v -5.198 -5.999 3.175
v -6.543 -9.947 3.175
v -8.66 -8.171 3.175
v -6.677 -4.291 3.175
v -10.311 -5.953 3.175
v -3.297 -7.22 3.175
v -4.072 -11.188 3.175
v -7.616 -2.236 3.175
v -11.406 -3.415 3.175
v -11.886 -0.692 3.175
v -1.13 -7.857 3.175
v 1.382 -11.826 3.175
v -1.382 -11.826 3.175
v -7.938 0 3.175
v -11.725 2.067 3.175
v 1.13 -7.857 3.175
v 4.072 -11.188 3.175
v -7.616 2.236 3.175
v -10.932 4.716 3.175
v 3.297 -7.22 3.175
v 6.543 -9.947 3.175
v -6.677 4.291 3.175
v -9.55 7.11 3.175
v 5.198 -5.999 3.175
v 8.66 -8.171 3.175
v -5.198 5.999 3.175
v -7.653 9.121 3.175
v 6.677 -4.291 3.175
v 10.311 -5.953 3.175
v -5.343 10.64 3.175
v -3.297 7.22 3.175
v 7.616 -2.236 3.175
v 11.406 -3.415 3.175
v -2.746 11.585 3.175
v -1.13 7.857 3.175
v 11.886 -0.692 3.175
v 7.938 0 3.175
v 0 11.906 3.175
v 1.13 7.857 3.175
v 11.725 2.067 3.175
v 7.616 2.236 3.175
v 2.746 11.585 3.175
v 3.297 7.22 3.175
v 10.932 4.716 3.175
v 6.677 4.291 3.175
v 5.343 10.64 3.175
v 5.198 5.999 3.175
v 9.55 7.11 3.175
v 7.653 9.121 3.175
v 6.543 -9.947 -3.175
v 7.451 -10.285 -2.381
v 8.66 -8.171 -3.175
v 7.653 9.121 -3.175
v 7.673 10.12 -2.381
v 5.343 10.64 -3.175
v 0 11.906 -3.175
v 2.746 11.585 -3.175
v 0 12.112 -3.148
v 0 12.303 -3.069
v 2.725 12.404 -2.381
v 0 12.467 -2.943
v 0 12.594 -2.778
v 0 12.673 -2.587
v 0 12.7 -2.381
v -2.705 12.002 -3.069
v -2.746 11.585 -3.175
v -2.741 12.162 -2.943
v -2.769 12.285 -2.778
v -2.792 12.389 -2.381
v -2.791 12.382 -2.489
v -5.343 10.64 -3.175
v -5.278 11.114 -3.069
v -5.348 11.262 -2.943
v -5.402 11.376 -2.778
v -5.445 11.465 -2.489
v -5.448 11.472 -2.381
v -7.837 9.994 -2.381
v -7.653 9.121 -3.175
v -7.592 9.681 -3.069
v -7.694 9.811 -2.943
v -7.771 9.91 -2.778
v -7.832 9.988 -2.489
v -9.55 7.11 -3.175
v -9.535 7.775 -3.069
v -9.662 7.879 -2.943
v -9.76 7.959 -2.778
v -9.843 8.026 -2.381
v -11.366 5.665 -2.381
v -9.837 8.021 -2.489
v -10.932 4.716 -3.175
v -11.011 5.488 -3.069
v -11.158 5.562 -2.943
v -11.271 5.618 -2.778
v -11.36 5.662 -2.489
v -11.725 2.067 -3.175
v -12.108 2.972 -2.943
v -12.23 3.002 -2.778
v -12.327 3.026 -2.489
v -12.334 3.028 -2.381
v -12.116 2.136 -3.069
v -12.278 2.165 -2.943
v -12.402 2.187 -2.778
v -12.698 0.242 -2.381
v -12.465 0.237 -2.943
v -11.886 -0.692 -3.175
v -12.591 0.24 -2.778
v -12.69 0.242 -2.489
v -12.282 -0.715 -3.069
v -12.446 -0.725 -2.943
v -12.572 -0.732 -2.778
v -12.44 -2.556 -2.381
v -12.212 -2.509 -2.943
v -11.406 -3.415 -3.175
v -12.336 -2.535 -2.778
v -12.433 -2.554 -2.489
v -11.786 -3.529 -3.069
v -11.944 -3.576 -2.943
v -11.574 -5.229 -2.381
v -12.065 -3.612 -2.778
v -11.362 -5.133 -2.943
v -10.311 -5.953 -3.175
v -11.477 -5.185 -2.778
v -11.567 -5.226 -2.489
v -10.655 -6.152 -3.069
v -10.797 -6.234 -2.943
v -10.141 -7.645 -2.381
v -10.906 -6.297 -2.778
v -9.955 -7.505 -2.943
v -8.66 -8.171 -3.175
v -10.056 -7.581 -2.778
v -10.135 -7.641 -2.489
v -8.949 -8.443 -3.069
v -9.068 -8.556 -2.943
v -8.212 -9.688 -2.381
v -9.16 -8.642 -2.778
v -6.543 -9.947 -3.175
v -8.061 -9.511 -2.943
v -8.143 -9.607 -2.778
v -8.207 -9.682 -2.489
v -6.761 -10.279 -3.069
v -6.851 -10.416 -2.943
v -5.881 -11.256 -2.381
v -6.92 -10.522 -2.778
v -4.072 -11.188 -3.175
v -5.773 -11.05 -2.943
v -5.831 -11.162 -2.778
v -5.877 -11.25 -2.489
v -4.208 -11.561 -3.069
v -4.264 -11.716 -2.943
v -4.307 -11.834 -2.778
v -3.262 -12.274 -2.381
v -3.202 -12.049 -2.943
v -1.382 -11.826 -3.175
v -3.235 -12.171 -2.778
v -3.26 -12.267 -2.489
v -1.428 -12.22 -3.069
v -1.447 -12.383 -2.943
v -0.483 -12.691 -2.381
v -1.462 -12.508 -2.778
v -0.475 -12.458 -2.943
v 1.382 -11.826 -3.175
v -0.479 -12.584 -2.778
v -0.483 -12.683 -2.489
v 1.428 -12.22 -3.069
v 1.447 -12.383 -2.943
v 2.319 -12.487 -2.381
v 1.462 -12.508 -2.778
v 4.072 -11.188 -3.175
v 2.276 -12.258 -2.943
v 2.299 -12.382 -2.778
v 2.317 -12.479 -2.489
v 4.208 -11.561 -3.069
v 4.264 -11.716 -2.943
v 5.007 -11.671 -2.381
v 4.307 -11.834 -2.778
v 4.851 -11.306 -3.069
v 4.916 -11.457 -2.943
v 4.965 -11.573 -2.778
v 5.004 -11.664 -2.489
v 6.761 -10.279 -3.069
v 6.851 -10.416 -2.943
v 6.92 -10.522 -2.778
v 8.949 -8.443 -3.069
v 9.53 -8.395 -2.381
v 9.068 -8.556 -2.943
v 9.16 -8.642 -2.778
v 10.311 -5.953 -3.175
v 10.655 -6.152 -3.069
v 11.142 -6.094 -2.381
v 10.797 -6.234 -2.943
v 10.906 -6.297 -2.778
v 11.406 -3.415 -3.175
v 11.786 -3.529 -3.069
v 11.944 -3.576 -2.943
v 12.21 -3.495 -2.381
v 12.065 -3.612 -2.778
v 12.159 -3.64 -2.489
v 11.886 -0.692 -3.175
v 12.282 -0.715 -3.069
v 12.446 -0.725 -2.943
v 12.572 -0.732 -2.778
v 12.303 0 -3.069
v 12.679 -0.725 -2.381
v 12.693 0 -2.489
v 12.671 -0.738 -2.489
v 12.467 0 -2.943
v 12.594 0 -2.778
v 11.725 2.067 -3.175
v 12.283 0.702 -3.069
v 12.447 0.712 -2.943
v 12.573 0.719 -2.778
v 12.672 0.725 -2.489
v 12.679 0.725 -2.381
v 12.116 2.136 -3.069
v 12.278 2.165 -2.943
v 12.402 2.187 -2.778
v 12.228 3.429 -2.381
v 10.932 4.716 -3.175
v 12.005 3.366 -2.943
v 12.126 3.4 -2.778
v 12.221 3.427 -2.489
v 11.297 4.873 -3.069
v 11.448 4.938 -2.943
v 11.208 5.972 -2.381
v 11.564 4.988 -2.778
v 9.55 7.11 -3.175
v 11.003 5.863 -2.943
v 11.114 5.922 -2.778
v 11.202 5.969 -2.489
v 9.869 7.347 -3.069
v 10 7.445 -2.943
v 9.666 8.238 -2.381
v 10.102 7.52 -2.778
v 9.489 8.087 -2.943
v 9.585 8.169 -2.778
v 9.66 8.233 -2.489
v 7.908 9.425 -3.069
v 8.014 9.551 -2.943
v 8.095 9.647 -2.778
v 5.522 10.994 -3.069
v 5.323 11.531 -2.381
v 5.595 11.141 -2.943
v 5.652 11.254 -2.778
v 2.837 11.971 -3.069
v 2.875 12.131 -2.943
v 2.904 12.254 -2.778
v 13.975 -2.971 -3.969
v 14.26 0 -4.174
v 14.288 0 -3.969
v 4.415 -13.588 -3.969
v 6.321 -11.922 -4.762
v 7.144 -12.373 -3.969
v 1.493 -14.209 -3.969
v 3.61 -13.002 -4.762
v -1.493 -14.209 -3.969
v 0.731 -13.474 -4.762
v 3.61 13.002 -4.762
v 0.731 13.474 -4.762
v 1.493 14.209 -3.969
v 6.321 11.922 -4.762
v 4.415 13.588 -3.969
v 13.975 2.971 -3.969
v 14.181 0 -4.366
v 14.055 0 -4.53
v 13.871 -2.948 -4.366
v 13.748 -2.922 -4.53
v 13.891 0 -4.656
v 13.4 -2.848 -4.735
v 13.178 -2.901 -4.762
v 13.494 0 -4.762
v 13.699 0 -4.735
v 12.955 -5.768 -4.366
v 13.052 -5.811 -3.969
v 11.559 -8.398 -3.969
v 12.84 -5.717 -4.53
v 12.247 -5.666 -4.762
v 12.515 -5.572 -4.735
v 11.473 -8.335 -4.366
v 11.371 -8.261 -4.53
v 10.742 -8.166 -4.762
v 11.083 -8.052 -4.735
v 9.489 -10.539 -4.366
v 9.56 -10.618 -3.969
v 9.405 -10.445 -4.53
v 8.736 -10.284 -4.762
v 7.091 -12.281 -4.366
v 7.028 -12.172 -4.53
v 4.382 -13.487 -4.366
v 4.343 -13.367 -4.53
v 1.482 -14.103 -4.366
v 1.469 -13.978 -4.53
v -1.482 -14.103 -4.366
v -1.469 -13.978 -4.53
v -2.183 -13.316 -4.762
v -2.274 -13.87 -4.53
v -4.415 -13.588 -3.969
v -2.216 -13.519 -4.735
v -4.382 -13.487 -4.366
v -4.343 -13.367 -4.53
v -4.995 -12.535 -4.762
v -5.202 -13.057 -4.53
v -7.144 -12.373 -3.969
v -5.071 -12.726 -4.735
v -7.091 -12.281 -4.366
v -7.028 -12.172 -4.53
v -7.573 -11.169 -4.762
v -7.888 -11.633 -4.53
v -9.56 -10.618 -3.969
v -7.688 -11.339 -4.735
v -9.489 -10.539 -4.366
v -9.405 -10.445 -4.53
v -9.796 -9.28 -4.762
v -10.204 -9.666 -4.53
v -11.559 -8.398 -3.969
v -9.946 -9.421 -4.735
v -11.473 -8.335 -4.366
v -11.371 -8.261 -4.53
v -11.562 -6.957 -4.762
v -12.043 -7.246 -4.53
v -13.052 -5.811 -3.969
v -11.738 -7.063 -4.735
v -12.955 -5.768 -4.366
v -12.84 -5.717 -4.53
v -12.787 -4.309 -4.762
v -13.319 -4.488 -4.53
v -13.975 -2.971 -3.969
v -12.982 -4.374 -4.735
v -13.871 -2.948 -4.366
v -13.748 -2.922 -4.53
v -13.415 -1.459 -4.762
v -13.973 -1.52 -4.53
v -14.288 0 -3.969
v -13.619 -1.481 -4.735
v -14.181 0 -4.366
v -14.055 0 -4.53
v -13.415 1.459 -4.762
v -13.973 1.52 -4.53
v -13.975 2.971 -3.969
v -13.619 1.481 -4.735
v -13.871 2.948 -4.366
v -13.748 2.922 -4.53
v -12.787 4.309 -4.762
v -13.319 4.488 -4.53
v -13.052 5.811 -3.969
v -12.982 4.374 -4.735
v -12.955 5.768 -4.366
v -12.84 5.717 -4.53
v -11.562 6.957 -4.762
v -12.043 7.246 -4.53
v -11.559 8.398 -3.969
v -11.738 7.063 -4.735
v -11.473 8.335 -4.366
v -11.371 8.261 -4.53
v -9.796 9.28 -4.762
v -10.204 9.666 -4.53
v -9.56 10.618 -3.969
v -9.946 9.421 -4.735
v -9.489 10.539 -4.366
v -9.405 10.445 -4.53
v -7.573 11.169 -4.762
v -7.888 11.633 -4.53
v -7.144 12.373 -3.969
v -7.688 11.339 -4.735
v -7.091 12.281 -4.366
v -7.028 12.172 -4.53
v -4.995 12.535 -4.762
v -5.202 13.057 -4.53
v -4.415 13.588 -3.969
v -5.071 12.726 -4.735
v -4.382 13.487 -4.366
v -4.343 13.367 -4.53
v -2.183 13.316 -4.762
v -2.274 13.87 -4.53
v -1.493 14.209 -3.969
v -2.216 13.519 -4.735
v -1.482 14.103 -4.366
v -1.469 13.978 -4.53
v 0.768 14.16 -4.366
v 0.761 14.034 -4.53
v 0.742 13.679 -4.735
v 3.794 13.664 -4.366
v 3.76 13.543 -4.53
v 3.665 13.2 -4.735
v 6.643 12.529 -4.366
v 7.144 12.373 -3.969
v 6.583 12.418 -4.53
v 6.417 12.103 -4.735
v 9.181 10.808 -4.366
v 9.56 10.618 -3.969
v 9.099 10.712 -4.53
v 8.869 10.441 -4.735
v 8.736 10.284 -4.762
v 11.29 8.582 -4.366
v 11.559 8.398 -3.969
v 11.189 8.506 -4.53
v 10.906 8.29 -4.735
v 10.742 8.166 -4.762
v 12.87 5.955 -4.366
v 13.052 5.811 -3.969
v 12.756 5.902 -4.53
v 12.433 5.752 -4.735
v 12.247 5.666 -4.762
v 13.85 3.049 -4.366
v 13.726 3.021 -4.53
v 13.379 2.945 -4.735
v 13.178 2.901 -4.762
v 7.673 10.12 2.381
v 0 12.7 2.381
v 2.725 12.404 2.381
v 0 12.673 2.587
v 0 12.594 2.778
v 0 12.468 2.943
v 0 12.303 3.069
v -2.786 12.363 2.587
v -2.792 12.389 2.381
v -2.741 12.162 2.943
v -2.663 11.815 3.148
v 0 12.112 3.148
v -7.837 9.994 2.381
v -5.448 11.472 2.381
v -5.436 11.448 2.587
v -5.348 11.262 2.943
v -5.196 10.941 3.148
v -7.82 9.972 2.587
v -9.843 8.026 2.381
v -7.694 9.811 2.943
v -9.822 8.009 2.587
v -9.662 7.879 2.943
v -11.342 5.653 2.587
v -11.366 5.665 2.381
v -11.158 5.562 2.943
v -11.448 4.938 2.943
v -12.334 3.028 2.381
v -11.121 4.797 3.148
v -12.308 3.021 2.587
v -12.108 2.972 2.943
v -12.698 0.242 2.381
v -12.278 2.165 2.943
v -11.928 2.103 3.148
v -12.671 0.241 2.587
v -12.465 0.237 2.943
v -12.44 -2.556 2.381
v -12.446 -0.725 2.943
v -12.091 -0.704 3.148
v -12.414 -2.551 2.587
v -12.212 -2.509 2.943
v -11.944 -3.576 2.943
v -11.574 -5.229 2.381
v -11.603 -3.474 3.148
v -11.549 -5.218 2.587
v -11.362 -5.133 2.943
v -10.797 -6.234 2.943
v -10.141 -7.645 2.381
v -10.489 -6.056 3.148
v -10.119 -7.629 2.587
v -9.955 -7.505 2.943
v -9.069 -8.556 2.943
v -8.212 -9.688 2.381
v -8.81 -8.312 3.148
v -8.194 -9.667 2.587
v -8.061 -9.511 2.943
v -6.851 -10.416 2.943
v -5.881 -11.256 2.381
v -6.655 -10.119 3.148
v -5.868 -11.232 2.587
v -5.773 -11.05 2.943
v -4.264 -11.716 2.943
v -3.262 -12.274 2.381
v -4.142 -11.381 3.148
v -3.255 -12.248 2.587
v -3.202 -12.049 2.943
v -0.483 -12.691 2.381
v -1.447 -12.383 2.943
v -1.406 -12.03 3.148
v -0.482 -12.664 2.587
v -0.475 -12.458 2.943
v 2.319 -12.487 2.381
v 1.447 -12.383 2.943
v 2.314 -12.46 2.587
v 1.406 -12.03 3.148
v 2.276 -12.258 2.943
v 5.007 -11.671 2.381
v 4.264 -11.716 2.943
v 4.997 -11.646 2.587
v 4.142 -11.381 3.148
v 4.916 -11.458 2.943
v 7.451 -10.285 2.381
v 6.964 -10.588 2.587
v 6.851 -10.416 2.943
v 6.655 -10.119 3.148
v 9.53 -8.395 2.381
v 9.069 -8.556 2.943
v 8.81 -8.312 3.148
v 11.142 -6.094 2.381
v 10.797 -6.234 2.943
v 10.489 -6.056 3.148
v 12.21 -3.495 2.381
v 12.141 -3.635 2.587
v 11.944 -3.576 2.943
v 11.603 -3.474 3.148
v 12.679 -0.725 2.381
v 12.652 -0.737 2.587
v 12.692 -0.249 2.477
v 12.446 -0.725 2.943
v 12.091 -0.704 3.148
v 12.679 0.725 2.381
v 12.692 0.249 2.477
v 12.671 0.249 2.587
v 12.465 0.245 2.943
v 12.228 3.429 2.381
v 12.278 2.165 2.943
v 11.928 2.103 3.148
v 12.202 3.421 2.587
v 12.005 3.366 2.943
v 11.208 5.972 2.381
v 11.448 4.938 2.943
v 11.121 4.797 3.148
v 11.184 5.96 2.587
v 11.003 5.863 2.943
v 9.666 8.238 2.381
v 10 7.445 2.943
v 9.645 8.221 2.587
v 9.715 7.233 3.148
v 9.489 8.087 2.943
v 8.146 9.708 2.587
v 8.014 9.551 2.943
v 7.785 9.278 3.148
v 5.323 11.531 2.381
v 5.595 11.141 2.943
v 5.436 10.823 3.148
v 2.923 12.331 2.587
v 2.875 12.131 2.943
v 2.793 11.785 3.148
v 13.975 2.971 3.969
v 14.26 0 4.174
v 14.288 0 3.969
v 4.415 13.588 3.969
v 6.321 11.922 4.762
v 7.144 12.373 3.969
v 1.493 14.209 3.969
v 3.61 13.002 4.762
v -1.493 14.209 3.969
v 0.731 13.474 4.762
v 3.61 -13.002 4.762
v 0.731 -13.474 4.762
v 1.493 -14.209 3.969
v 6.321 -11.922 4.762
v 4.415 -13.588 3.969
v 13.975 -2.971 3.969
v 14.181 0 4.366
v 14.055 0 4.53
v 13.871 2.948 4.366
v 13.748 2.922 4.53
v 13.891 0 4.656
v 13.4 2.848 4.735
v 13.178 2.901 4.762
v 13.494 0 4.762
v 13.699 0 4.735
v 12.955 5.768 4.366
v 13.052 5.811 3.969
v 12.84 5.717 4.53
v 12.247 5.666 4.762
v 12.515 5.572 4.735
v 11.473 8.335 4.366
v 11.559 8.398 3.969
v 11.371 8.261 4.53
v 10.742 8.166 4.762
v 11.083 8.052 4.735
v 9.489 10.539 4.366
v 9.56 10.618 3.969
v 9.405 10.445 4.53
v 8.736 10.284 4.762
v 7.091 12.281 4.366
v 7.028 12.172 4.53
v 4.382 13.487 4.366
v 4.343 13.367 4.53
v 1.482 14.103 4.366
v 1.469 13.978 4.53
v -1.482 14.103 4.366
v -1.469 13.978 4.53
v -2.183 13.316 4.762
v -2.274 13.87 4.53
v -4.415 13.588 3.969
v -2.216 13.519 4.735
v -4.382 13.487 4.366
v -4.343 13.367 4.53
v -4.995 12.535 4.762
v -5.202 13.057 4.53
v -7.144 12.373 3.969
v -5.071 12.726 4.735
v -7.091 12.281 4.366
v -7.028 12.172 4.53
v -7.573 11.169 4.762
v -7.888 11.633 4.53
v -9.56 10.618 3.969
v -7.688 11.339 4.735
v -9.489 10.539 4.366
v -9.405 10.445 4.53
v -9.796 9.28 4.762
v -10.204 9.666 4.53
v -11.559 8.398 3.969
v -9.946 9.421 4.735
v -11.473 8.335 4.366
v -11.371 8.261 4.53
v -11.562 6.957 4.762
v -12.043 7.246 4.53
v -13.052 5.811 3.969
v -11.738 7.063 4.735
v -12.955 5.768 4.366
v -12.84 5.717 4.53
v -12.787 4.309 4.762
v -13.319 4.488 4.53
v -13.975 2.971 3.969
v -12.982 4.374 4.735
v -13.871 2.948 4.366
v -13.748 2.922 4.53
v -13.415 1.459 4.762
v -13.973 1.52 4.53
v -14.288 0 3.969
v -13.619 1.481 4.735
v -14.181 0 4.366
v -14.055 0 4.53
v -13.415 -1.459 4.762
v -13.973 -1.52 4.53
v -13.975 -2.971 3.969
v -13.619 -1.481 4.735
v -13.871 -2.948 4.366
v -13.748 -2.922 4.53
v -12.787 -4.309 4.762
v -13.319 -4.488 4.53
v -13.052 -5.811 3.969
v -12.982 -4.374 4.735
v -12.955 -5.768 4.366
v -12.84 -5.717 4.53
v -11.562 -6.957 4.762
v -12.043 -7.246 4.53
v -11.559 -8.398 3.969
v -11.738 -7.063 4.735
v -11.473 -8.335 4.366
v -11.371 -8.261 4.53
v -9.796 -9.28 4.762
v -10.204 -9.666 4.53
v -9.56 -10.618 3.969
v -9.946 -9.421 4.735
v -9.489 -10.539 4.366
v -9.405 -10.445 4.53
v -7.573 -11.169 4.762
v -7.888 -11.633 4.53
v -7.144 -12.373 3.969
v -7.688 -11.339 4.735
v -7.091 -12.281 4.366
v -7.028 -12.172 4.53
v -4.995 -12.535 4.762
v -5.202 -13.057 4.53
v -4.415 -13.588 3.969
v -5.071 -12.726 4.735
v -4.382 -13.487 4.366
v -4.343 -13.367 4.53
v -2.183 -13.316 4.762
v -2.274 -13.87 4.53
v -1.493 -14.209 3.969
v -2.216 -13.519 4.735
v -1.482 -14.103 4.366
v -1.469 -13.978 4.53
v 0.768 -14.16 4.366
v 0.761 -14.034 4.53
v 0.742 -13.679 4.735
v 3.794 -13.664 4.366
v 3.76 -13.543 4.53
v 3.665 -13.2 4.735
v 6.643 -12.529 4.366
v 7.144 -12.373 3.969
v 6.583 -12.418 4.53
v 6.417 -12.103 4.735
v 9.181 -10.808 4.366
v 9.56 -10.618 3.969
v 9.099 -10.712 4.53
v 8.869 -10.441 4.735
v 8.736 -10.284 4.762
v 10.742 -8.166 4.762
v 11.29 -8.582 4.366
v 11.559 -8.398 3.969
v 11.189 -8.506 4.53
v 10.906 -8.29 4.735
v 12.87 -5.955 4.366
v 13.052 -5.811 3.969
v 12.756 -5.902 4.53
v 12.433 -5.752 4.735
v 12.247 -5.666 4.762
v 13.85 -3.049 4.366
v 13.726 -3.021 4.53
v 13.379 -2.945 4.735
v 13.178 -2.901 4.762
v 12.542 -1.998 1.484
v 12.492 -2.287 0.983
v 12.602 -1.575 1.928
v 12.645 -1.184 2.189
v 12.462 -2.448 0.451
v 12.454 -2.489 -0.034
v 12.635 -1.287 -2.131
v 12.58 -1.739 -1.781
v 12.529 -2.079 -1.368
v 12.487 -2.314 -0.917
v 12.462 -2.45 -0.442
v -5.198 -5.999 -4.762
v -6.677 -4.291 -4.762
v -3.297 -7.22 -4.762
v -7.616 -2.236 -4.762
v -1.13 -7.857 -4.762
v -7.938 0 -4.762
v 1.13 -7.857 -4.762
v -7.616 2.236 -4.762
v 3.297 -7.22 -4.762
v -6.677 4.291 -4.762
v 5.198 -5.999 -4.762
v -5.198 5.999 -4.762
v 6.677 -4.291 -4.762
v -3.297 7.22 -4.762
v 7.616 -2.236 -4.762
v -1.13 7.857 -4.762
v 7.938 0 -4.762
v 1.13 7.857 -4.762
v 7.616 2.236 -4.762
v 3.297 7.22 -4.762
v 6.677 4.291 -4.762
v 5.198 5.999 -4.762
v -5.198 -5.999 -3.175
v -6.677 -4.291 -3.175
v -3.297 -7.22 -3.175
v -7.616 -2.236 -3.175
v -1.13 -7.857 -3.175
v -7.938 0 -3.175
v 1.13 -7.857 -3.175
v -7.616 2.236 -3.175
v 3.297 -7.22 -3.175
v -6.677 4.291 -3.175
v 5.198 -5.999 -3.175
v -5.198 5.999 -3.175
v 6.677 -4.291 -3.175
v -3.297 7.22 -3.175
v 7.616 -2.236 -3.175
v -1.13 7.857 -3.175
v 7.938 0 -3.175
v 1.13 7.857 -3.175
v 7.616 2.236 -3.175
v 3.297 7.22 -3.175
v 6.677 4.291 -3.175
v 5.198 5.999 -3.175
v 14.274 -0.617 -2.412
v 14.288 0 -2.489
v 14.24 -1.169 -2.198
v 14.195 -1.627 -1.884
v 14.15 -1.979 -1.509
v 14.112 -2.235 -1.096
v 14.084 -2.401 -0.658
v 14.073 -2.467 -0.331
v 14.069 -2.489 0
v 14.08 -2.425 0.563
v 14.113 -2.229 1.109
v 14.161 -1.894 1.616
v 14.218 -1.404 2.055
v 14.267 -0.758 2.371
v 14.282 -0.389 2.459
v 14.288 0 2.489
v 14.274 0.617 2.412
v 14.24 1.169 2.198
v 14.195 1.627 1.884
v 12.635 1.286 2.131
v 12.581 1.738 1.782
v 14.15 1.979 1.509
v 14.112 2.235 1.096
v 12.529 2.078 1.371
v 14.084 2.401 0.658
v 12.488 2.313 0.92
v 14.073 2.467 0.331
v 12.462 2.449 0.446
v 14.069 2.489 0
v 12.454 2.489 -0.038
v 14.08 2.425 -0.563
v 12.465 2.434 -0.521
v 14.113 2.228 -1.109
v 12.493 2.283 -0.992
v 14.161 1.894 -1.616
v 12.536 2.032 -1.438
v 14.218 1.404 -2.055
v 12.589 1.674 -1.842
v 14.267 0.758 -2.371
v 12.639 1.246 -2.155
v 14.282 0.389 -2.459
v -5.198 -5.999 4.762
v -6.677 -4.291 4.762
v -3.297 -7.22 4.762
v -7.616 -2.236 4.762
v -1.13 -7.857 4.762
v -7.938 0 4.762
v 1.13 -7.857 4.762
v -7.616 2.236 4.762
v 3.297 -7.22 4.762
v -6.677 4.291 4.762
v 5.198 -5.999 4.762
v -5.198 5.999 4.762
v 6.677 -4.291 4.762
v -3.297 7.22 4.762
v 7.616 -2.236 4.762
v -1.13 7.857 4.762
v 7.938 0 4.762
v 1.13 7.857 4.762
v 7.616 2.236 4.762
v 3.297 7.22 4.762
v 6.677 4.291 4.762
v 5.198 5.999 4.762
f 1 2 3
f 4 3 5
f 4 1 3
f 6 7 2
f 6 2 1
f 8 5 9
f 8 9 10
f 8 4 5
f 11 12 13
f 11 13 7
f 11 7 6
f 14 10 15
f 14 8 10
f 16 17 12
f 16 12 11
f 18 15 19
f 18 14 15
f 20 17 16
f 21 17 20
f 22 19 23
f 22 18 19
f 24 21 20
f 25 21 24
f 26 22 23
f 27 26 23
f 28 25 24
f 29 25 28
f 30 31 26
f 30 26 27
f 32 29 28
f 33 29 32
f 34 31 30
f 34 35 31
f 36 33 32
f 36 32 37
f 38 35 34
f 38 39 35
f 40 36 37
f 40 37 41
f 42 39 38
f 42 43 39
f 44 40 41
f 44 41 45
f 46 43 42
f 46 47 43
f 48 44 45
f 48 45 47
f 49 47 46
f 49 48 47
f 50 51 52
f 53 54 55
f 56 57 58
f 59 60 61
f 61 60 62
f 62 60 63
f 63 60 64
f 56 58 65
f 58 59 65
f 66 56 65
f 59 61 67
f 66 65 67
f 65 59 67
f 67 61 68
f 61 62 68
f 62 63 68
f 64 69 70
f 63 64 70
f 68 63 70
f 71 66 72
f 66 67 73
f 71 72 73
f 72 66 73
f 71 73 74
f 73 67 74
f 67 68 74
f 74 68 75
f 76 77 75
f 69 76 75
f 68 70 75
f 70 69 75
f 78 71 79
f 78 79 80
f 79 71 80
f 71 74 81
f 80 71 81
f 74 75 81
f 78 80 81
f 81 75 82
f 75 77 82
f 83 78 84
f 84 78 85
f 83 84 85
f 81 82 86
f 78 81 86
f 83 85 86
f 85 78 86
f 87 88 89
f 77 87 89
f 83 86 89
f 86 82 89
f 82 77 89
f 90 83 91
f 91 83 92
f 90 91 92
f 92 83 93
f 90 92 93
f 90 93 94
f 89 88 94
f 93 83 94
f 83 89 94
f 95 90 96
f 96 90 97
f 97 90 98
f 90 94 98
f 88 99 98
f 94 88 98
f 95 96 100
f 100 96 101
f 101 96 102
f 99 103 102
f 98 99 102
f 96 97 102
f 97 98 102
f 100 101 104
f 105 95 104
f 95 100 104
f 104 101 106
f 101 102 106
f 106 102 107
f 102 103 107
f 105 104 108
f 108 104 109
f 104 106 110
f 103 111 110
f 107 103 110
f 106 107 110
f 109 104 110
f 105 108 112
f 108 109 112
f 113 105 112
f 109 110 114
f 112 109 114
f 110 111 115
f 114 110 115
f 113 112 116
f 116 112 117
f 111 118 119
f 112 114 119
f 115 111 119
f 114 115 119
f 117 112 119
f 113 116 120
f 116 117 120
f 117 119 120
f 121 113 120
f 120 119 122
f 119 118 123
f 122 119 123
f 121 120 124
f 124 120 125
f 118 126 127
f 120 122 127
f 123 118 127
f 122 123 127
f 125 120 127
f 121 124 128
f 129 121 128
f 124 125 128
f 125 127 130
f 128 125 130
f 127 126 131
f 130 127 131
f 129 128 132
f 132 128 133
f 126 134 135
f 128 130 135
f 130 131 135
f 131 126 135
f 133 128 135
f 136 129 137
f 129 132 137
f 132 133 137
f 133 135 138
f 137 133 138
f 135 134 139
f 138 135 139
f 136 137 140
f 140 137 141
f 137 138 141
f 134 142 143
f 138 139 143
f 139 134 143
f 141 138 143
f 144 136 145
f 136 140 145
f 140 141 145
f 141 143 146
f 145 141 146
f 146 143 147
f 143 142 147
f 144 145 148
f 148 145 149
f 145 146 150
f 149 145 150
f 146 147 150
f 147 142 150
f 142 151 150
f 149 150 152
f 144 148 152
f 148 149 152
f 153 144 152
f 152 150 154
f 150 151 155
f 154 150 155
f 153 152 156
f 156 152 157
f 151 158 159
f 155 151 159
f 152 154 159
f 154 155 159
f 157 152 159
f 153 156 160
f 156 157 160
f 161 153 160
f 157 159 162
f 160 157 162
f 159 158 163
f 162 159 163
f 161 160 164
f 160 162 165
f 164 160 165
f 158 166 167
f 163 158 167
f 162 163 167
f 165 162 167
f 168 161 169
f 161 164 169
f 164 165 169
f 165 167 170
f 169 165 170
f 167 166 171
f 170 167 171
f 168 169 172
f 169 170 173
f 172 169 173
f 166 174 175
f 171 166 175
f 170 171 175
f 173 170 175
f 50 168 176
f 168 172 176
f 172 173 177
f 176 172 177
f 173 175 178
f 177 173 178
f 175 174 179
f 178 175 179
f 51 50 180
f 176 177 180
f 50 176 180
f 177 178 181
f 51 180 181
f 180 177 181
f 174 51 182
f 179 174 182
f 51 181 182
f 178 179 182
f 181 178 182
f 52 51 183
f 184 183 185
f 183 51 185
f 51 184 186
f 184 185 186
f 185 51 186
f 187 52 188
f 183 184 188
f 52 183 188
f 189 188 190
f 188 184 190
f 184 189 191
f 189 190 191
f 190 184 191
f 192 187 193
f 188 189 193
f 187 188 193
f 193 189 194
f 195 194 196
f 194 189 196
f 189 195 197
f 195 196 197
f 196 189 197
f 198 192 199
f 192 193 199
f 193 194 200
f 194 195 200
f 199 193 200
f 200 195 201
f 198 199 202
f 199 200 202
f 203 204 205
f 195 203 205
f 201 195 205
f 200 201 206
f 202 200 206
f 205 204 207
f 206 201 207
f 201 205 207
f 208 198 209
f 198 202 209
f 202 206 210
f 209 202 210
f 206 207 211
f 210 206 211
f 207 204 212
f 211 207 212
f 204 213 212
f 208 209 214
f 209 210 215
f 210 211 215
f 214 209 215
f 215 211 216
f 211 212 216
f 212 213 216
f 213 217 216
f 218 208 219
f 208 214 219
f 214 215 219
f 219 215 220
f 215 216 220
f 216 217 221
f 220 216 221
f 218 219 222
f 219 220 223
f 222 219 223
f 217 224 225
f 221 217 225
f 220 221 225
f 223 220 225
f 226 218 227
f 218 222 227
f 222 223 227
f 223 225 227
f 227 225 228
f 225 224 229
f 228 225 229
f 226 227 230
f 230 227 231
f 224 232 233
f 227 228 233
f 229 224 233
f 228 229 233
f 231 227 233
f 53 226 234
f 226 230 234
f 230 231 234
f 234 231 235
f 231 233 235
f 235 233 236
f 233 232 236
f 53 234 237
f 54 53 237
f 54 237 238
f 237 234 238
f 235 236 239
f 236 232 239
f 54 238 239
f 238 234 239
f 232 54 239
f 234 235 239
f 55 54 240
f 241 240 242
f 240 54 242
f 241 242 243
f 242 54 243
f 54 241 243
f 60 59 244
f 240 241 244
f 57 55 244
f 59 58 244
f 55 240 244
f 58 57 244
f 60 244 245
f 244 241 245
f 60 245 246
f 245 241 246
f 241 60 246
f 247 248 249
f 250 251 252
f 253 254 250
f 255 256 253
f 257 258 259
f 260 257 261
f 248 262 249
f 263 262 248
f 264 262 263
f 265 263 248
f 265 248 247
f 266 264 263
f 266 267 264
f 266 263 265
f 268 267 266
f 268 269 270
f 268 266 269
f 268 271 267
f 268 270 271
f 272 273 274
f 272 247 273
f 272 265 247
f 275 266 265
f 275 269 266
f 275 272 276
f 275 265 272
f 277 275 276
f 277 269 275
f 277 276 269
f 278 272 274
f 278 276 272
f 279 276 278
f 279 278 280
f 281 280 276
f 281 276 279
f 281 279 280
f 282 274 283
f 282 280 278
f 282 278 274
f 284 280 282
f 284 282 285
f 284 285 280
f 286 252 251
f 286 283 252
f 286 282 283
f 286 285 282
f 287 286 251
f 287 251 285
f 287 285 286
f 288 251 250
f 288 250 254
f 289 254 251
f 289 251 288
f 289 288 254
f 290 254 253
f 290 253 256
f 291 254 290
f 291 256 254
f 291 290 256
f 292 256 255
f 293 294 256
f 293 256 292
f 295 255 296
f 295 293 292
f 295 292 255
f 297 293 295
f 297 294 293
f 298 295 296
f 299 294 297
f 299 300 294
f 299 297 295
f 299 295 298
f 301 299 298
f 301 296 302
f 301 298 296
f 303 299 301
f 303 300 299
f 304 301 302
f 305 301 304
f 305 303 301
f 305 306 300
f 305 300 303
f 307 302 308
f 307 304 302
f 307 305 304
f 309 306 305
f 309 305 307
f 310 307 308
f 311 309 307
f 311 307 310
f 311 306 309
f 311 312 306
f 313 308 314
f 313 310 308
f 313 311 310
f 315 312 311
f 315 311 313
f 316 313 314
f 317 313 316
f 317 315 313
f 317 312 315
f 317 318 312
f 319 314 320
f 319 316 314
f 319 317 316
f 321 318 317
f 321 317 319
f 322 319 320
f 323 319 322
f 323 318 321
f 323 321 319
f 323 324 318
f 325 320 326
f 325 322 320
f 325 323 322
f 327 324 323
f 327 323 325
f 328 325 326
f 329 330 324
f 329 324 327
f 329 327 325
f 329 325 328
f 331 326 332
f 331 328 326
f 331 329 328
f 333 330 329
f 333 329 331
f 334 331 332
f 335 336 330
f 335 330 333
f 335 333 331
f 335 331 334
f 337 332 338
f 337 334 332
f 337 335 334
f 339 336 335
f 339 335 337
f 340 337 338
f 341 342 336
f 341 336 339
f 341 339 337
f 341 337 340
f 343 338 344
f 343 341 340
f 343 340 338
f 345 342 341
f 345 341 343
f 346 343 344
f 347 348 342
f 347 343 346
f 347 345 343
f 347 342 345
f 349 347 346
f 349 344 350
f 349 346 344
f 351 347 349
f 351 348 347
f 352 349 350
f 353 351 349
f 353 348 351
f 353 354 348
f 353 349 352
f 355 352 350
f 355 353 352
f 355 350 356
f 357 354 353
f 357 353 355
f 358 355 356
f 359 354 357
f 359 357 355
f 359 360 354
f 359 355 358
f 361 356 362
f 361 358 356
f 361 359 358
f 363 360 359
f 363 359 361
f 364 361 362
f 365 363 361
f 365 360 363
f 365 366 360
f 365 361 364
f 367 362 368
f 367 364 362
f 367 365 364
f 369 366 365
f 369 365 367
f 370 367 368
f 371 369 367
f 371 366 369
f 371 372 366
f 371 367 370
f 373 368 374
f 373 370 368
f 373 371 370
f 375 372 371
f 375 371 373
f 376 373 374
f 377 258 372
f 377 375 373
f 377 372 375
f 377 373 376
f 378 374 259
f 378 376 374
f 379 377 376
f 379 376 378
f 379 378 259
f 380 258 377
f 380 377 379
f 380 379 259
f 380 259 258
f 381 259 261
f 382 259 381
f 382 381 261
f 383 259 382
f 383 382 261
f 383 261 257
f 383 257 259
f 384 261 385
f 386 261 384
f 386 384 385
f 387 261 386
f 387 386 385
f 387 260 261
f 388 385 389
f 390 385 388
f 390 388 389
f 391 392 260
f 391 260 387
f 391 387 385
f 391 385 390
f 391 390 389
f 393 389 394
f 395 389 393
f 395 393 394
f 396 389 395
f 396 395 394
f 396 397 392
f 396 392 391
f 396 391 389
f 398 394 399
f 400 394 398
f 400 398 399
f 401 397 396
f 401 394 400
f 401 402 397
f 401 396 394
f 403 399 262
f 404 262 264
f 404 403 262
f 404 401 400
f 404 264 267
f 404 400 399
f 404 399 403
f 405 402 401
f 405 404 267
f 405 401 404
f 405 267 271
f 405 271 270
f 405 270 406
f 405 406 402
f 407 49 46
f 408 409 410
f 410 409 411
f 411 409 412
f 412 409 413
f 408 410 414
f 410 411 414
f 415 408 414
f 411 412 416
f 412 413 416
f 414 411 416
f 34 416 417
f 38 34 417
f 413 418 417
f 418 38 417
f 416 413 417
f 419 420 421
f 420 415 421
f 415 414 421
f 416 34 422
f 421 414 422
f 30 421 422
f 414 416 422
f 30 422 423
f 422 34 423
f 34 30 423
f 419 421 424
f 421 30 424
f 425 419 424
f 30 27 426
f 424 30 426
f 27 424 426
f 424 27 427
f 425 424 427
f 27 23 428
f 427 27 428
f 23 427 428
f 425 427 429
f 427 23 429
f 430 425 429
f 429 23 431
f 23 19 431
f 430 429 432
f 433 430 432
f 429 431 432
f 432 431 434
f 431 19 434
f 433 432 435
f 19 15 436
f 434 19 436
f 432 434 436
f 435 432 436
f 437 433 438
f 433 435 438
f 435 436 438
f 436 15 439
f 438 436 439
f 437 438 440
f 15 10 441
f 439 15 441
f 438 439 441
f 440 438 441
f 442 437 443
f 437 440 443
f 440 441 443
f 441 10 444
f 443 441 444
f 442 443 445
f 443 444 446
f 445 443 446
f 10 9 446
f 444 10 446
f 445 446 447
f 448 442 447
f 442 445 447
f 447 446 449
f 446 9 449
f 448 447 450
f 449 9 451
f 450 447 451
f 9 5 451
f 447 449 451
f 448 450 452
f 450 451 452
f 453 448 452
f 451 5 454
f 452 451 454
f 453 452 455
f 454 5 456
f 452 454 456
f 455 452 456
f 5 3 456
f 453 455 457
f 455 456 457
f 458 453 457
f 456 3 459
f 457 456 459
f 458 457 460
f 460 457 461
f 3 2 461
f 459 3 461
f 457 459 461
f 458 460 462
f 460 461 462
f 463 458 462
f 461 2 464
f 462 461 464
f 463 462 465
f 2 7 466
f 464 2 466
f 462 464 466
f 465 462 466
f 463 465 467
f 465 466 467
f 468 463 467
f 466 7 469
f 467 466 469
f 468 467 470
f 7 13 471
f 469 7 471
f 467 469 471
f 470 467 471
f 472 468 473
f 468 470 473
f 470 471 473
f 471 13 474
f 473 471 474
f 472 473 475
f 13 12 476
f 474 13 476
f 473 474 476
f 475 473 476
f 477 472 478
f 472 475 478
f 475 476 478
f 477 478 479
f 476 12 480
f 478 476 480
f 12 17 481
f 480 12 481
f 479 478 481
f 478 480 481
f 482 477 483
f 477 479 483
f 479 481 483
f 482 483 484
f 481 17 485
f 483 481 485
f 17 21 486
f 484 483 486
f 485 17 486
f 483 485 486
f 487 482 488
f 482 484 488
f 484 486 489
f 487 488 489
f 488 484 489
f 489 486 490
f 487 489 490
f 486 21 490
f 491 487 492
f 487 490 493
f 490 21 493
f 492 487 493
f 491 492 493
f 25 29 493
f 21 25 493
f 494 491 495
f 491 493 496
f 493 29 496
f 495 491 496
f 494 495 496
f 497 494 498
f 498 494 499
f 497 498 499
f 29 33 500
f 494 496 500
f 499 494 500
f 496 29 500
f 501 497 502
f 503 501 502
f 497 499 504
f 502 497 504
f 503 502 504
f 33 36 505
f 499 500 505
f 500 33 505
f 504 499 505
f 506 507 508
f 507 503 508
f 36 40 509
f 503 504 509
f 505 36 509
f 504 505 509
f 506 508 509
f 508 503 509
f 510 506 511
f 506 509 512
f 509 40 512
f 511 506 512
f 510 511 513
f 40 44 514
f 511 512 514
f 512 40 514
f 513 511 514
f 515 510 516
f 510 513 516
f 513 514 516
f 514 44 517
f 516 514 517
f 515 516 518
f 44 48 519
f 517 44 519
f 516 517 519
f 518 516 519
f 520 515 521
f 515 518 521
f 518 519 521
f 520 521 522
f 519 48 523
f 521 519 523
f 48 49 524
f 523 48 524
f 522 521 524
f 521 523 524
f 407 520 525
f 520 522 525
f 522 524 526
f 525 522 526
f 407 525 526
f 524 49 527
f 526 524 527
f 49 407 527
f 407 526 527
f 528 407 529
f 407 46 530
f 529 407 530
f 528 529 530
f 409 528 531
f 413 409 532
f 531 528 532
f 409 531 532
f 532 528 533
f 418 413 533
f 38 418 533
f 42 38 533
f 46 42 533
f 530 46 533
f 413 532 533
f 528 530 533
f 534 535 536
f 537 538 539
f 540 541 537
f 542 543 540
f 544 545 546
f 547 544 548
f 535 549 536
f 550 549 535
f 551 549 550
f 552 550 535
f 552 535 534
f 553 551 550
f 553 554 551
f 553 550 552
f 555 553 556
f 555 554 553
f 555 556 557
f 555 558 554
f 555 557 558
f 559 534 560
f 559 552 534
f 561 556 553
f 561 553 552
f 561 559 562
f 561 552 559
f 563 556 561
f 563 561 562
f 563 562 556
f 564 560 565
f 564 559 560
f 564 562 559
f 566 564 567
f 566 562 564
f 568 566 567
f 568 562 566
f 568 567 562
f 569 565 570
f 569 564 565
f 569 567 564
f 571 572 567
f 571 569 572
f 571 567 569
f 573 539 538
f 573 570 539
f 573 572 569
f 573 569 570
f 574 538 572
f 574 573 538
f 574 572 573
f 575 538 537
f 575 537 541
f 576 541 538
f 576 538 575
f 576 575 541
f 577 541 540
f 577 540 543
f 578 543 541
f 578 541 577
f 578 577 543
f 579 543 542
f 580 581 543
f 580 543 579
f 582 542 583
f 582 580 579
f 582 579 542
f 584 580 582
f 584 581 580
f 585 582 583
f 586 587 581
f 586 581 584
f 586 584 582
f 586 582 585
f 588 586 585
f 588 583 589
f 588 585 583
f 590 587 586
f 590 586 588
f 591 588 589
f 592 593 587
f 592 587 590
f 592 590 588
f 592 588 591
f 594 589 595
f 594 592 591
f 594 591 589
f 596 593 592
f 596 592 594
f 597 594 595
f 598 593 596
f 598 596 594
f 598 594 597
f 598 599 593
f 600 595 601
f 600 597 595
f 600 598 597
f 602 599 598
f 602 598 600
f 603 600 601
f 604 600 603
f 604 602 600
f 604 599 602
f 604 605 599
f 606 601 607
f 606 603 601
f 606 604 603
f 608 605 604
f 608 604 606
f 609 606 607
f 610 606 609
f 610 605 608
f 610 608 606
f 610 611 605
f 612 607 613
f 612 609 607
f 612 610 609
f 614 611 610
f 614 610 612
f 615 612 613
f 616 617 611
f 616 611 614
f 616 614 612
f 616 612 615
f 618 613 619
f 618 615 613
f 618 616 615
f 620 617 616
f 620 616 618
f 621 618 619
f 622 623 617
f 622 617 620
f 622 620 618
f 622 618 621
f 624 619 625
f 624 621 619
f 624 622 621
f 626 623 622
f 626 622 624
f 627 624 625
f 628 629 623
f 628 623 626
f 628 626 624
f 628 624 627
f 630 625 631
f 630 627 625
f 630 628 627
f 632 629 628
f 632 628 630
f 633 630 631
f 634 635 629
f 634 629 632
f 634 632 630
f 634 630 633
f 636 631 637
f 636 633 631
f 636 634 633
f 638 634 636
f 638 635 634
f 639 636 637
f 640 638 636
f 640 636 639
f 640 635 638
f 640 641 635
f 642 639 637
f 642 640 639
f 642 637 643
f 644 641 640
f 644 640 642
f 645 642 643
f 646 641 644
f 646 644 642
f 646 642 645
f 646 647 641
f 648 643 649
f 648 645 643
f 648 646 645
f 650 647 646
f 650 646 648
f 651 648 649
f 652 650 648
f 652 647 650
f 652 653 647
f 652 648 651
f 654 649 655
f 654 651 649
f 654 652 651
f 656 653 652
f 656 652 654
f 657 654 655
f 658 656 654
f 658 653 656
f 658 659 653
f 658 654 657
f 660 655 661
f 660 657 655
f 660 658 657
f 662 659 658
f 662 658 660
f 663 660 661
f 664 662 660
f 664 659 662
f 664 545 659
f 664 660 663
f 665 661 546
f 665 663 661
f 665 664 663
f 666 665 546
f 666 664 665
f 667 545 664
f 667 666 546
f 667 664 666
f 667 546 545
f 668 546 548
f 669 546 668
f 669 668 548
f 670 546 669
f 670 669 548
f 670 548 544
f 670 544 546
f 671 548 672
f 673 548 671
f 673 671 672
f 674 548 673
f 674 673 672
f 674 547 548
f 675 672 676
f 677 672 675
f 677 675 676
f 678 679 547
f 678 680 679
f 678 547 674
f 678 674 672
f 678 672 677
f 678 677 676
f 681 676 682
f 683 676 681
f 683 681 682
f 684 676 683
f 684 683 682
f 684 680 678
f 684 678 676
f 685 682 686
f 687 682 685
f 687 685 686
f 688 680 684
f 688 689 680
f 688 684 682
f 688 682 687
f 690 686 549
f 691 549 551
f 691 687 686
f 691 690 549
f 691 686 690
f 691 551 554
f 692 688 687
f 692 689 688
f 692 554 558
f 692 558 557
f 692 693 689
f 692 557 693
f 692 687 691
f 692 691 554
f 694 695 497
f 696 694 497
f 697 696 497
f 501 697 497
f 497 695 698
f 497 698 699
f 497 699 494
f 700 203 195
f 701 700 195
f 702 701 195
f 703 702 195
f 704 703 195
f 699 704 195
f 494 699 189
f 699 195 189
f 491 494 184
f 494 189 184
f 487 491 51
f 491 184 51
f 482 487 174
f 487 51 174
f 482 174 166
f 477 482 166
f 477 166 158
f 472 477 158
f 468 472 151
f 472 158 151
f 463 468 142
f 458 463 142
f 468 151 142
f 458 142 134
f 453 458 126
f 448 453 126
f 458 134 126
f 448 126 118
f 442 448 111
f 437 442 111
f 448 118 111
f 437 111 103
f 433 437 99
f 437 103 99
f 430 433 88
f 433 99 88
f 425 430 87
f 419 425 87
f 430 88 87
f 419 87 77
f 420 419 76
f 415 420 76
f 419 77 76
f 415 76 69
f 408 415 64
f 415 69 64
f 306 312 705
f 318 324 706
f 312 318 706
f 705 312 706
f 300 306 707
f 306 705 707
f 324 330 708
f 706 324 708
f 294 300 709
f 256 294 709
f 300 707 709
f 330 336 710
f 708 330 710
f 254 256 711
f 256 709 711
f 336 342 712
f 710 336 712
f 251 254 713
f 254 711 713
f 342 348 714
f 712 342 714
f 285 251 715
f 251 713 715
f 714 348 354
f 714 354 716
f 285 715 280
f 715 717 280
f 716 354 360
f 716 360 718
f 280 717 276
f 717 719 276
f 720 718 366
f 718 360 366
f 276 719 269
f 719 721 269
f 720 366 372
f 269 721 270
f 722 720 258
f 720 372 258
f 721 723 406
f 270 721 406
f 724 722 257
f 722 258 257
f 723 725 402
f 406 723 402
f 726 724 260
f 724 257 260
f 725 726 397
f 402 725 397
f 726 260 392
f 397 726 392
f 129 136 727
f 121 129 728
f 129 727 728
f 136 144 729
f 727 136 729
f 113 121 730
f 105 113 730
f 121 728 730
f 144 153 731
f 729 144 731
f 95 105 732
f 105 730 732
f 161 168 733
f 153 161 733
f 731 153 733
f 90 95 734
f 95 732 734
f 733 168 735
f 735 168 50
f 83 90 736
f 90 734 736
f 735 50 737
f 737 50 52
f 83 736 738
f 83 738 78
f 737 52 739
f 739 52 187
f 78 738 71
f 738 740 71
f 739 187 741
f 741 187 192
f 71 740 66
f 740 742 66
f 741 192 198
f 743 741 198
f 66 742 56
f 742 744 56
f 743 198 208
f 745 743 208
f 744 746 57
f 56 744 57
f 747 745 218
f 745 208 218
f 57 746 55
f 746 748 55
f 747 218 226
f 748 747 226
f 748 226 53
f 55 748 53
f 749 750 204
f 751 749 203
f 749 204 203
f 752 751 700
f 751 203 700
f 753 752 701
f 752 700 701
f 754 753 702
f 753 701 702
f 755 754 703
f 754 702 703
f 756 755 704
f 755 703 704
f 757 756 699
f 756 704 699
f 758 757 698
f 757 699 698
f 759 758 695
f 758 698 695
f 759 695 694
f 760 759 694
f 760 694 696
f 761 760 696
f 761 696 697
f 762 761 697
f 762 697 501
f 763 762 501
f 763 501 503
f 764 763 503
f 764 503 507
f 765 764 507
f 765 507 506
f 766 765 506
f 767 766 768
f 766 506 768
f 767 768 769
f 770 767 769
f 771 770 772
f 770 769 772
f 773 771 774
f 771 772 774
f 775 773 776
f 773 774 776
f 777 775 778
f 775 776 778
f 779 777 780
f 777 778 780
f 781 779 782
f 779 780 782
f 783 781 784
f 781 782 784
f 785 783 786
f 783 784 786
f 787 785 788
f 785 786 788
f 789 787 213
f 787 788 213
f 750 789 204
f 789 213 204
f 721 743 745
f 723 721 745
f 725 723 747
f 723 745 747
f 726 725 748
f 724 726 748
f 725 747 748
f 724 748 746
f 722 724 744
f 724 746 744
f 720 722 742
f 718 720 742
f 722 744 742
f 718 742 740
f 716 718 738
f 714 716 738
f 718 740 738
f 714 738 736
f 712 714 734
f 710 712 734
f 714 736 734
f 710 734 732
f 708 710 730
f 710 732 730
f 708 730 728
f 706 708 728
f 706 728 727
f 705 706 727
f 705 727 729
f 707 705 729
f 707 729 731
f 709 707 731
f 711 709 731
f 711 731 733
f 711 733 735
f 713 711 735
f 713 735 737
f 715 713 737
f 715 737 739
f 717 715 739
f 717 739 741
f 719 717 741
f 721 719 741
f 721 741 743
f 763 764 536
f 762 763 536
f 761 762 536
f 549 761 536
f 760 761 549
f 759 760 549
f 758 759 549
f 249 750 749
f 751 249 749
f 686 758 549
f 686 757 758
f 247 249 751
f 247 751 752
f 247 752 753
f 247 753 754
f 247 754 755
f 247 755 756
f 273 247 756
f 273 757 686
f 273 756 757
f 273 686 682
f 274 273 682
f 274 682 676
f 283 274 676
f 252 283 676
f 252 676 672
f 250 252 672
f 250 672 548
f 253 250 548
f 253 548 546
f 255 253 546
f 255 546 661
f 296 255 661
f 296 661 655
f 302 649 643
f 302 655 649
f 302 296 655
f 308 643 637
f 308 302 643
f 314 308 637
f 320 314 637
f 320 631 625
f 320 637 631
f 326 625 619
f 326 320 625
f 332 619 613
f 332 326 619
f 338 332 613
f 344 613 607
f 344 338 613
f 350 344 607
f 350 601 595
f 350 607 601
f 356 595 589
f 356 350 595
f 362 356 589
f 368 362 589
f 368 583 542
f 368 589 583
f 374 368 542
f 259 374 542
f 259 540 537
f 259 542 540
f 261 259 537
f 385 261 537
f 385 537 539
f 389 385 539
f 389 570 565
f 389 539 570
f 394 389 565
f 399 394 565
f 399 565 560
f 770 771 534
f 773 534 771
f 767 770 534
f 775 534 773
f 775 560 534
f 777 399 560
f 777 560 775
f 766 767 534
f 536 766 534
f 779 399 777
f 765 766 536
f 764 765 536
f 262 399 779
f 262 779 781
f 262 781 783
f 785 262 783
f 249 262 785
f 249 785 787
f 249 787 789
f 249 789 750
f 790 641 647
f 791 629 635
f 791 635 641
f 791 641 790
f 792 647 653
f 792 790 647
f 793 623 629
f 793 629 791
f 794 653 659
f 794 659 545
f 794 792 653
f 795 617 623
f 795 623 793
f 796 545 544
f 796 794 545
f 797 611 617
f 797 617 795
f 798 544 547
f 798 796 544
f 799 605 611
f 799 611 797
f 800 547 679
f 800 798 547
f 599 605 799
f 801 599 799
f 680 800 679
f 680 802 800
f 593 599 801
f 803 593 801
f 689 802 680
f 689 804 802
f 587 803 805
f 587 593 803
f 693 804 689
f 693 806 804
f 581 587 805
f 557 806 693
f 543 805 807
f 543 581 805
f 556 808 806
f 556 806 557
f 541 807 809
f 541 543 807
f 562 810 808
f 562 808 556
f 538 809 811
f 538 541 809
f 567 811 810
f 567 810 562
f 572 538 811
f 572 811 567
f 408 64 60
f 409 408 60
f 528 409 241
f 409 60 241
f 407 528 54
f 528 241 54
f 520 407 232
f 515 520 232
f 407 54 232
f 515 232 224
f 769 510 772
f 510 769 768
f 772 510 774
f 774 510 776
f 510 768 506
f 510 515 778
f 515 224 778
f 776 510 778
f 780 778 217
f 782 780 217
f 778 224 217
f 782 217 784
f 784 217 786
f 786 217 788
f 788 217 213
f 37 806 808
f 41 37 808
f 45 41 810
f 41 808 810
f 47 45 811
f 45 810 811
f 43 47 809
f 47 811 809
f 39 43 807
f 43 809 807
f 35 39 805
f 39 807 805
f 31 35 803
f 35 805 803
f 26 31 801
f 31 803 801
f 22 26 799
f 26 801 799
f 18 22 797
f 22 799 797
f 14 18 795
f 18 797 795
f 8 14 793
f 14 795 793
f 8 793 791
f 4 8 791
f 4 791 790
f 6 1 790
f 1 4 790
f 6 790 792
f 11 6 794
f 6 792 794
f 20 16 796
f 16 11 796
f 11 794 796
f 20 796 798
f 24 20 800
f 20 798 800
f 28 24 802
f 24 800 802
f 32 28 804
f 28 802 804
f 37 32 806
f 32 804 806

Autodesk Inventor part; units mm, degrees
ref_plane "XZ Plane" through (0, 0, 0) normal (0, 1, 0) x (-1, 0, 0)
ref_plane "XY Plane" through (0, 0, 0) normal (0, 0, 1) x (1, 0, 0)
sketch "Sketch1" plane through (0, 0, 0) normal (0, 0, 1) x (1, 0, 0)
  circle A0 centre (0, 0) radius 14.2875
  dimension "d0" = 28.575
extrude "Extrusion1" add sketch "Sketch1" along normal mid plane 9.525
fillet "Fillet1" radius 0.7937 2 edges at (-14.2875, 0, 4.7625) (-14.2875, 0, -4.7625)
sketch "Sketch2" plane through (0, 0, 4.7625) normal (0, 0, 1) x (1, 0, 0)
  circle A0 centre (0, 0) radius 13.4938 projected
  circle A1 centre (0, 0) radius 7.9375
  dimension "d4" = 15.875
extrude "Extrusion2" cut sketch "Sketch2" against normal up to next contours A1
sketch "Sketch3" plane through (0, 0, 0) normal (1, 0, 0) x (0, 1, 0)
  line L0 (7.9375, 3.175) -> (11.9062, 3.175)
  line L1 (12.7, 2.3813) -> (12.7, -2.3813)
  line L2 (11.9062, -3.175) -> (7.9375, -3.175)
  line L3 (7.9375, -3.175) -> (7.9375, 3.175)
  line L4 (-13.4938, 4.7625) -> (13.4938, 4.7625) projected
  line L5 (13.4938, -4.7625) -> (-13.4938, -4.7625) projected
  line L6 (14.2875, -3.9688) -> (14.2875, 3.9688) projected
  line L7 (7.9375, 4.7625) -> (7.9375, -4.7625) projected
  arc A0 (12.7, 2.3813) -> (11.9062, 3.175) centre (11.9062, 2.3813) ccw
  arc A1 (11.9062, -3.175) -> (12.7, -2.3813) centre (11.9062, -2.3813) ccw
  line L8 (0, 4.7625) -> (0, -4.7625)
  point P0 (0, 0)
  dimension "d7" = 1.5875
  dimension "d8" = 1.5875
  dimension "d9" = 1.5875
  dimension "d10" = 0.7937
revolve "Revolution1" cut sketch "Sketch3" angle 360 about axis through (0, 0, 4.7625) along (0, 0, -1) contours L0 A0 L1 A1 L2 L3
ref_plane "Work Plane1" through (14.2875, 0, 0) normal (1, 0, 0) x (0, 1, 0)
sketch "Sketch4" plane through (14.2875, 0, 0) normal (1, 0, 0) x (0, 1, 0)
  line L0 (13.4938, -4.7625) -> (-13.4937, -4.7625) projected
  line L1 (14.2875, -3.9688) -> (14.2875, 3.9688) projected
  point P0 (0, 0)
  point P1 (0, 0)
hole "Hole1" at (14.2875, 0, 0) direction (-1, 0, 0) diameter 4.9784 depth 25.4 tip angle 118 thread size "1/4-20 UNC" class "2B" standard "ANSI Unified Screw Threads"
equation "\"d8\" = d7"
equation "\"d9\" = d7"
properties part number "Misc_ShaftCollar_Triangle_SC10"
